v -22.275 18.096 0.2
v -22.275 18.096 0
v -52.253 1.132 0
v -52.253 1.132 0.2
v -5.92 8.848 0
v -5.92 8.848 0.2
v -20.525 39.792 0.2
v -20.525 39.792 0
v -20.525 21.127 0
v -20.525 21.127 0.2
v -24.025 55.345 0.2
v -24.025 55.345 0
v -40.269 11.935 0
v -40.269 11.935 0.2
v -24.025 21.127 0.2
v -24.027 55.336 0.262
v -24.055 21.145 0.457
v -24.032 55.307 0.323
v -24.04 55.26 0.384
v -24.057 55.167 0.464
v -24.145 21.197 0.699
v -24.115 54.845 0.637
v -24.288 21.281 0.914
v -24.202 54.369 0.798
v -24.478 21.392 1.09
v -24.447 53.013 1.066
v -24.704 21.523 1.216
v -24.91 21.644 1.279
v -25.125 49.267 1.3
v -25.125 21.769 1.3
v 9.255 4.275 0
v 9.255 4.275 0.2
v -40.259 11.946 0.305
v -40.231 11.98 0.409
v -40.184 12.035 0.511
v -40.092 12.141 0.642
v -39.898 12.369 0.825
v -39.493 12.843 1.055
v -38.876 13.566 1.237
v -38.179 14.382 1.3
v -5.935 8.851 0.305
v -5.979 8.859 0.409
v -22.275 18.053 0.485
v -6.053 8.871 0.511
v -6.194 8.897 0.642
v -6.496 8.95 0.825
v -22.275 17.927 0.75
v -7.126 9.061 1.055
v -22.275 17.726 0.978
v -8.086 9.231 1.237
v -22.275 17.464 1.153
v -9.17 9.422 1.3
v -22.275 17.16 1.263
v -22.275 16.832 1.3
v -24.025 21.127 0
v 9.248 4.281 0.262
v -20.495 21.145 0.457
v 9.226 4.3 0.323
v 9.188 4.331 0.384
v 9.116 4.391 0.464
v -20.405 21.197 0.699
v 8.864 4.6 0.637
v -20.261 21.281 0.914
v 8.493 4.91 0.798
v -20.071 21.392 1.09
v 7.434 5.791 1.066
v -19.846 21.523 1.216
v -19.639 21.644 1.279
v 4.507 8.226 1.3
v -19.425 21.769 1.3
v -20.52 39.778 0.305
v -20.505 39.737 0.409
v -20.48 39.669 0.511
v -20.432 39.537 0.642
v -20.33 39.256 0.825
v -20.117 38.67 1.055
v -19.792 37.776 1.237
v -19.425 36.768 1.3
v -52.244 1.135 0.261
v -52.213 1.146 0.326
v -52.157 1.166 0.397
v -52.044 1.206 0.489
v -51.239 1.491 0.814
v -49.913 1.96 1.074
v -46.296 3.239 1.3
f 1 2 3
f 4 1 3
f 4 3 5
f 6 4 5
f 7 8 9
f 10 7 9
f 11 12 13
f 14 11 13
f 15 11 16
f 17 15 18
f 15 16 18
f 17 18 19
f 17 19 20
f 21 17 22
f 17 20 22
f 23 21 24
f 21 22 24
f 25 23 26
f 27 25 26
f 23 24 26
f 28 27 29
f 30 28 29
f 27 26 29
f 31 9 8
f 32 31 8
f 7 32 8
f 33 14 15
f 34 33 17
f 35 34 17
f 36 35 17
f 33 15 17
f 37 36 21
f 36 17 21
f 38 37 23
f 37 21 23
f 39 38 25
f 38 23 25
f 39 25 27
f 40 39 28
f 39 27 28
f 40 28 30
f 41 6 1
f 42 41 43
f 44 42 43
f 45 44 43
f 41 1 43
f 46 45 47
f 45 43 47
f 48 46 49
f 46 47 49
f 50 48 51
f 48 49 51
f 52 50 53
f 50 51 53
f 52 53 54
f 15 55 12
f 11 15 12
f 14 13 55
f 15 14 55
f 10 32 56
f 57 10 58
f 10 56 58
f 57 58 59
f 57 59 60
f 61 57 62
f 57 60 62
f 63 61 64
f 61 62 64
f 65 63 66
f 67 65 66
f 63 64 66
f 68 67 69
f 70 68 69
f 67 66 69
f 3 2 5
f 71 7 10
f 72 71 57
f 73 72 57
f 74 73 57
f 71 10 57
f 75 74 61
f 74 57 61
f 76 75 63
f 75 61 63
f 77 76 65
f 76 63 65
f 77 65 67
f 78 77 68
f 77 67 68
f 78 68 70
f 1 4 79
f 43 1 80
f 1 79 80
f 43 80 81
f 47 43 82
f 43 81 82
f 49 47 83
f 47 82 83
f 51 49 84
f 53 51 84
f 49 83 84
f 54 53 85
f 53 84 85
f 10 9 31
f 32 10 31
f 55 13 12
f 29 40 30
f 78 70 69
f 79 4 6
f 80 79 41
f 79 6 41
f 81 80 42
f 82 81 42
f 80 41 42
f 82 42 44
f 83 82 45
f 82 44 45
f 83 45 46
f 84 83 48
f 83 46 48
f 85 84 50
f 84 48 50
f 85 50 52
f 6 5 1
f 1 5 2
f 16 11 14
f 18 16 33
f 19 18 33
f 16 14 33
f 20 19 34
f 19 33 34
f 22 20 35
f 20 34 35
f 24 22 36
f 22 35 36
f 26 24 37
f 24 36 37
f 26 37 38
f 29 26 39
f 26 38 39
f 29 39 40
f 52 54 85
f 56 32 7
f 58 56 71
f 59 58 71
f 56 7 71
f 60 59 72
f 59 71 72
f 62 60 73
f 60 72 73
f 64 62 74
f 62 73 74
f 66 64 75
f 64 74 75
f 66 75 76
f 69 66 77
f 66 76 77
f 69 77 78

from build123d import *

# Parameters (mm, degrees)
F1_DEPTH = 1.3
F2_R     = 1.1


with BuildPart() as f1:
    # F0 (on Top) → F1 (new body)
    with BuildSketch(Plane.XY):
        Polygon((-24.024894, 55.345223), (-40.268643, 11.935234), (-24.024894, 21.127389), align=None)
        Polygon((9.255313, 4.275105), (-20.524894, 39.791662), (-20.524894, 21.127389), align=None)
        Polygon((-52.252875, 1.132098), (-5.920418, 8.848136), (-22.274894, 18.0963), align=None)
    extrude(amount=F1_DEPTH)

    # F2
    f2_edges = [f1.edges().sort_by_distance(p)[0] for p in [
        (-32.146768, 33.640229, 1.3),
        (-32.146768, 16.531311, 1.3),
        (-24.024894, 38.236306, 1.3),
        (-5.63479, 22.033384, 1.3),
        (-20.524894, 30.459525, 1.3),
        (-5.63479, 12.701247, 1.3),
        (-29.086647, 4.990117, 1.3),
        (-14.097656, 13.472218, 1.3),
        (-37.263884, 9.614199, 1.3),
    ]]
    fillet(f2_edges, radius=F2_R)


solid = f1.part
